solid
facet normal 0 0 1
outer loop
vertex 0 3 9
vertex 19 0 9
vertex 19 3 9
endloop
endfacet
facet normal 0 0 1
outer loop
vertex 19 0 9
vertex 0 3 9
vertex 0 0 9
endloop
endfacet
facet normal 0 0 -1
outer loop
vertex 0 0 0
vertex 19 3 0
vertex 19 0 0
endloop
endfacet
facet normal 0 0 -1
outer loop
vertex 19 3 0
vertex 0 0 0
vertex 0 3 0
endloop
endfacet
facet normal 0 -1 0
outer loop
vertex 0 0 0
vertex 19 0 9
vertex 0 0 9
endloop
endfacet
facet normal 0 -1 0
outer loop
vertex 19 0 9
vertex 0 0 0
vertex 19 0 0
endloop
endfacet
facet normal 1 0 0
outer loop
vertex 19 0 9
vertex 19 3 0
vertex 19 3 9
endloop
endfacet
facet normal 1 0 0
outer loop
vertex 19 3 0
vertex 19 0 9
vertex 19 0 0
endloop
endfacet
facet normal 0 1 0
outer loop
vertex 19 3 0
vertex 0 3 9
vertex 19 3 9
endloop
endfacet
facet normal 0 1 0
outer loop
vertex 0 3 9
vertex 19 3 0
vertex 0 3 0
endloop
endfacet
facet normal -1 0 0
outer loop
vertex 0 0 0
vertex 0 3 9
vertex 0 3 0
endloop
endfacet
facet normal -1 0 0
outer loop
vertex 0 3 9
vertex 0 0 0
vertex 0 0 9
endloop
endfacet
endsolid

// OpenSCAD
// Generated by SolidPython 1.0.1 on 2020-07-29 00:46:56


cube(size = [19, 3, 9]);
/***********************************************
*********      SolidPython code:      **********
************************************************
 
# import packages: SolidPython
from solid import *
from solid.utils import *
from itertools import chain, combinations, permutations


class Resize:

    def __init__(self, scad_file):
        self.scad_file = scad_file
        #self.scad_file = import_scad(scad_file)
        # cone/cylinder param:
        self.r1 = 0
        self.r2 = 0
        self.h = 0
        # rectangular prism param:
        self.w = 0
        self.l = 0
        # ellipse param:
        self.r = 0

    # import OpenScad code (file name corresponds to shape)


    # classify shape + parameters
    def assign(self, param1, param2, param3):
        if self.scad_file == 'cone.scad':
            self.r1 = param1
            self.r2 = param2
            self.h = param3
        elif self.scad_file == 'cylinder.scad':
            self.r1 = param1
            self.r2 = param2
            self.h = param3
        elif self.scad_file == 'rectangularPrism.scad':
            self.h = param1
            self.l = param2
            self.w = param3
        else:
            self.r = param1
            self.h = param2

    # resize parameters
    def iterate(self):
        x = range(3, 20, 2)
        i = 1
        if self.scad_file == 'cone.scad':
            tempList = list(permutations(x, 2))
            for temp in tempList:
                param1 = temp[0]
                param2 = temp[1]
                filepath = 'produced_scad_files/' + 'cone' + str(param1) + '_' + str(param2) + '_' + '.scad'
                scad_render_to_file(cylinder(h=param1, r1=param2, r2=0), filepath)

        elif self.scad_file == 'cylinder.scad':
            tempList = list(permutations(x, 3))
            for temp in tempList:
                param1 = temp[0]
                param2 = temp[1]
                filepath = 'produced_scad_files/' + 'cylinder' + str(param1) + '_' + str(param2) + '_' + '.scad'
                scad_render_to_file(cylinder(h=param1, r1=param2, r2=param2), filepath)

        elif self.scad_file == 'rectangularPrism.scad':
            tempList = list(permutations(x, 3))
            for temp in tempList:
                param1 = temp[0]
                param2 = temp[1]
                param3 = temp[2]
                filepath = 'produced_scad_files/' + 'rectangularPrism' + str(param1) + '_' + str(param2) + '_' + str(
                    param3) + '.scad'
                scad_render_to_file(cube(size=(param1, param2, param3)), filepath)

        elif self.scad_file == 'ellipse.scad':
            tempList = list(permutations(x, 4))
            for temp in tempList:
                param1 = temp[0]
                param2 = temp[1]
                param3 = temp[2]
                param4 = temp[3]
                filepath = 'produced_scad_files/' + 'ellipse' + str(param1) + '_' + str(param2) + '_' + str(param3) + '_' + str(param4) + '.scad'
                scad_render_to_file(scale([param1, param2, param3])(sphere(r=param4)), filepath)

    def render_to_scadfile(self):
        scad_render_to_file(scad, 'example.scad') 
 
************************************************/
